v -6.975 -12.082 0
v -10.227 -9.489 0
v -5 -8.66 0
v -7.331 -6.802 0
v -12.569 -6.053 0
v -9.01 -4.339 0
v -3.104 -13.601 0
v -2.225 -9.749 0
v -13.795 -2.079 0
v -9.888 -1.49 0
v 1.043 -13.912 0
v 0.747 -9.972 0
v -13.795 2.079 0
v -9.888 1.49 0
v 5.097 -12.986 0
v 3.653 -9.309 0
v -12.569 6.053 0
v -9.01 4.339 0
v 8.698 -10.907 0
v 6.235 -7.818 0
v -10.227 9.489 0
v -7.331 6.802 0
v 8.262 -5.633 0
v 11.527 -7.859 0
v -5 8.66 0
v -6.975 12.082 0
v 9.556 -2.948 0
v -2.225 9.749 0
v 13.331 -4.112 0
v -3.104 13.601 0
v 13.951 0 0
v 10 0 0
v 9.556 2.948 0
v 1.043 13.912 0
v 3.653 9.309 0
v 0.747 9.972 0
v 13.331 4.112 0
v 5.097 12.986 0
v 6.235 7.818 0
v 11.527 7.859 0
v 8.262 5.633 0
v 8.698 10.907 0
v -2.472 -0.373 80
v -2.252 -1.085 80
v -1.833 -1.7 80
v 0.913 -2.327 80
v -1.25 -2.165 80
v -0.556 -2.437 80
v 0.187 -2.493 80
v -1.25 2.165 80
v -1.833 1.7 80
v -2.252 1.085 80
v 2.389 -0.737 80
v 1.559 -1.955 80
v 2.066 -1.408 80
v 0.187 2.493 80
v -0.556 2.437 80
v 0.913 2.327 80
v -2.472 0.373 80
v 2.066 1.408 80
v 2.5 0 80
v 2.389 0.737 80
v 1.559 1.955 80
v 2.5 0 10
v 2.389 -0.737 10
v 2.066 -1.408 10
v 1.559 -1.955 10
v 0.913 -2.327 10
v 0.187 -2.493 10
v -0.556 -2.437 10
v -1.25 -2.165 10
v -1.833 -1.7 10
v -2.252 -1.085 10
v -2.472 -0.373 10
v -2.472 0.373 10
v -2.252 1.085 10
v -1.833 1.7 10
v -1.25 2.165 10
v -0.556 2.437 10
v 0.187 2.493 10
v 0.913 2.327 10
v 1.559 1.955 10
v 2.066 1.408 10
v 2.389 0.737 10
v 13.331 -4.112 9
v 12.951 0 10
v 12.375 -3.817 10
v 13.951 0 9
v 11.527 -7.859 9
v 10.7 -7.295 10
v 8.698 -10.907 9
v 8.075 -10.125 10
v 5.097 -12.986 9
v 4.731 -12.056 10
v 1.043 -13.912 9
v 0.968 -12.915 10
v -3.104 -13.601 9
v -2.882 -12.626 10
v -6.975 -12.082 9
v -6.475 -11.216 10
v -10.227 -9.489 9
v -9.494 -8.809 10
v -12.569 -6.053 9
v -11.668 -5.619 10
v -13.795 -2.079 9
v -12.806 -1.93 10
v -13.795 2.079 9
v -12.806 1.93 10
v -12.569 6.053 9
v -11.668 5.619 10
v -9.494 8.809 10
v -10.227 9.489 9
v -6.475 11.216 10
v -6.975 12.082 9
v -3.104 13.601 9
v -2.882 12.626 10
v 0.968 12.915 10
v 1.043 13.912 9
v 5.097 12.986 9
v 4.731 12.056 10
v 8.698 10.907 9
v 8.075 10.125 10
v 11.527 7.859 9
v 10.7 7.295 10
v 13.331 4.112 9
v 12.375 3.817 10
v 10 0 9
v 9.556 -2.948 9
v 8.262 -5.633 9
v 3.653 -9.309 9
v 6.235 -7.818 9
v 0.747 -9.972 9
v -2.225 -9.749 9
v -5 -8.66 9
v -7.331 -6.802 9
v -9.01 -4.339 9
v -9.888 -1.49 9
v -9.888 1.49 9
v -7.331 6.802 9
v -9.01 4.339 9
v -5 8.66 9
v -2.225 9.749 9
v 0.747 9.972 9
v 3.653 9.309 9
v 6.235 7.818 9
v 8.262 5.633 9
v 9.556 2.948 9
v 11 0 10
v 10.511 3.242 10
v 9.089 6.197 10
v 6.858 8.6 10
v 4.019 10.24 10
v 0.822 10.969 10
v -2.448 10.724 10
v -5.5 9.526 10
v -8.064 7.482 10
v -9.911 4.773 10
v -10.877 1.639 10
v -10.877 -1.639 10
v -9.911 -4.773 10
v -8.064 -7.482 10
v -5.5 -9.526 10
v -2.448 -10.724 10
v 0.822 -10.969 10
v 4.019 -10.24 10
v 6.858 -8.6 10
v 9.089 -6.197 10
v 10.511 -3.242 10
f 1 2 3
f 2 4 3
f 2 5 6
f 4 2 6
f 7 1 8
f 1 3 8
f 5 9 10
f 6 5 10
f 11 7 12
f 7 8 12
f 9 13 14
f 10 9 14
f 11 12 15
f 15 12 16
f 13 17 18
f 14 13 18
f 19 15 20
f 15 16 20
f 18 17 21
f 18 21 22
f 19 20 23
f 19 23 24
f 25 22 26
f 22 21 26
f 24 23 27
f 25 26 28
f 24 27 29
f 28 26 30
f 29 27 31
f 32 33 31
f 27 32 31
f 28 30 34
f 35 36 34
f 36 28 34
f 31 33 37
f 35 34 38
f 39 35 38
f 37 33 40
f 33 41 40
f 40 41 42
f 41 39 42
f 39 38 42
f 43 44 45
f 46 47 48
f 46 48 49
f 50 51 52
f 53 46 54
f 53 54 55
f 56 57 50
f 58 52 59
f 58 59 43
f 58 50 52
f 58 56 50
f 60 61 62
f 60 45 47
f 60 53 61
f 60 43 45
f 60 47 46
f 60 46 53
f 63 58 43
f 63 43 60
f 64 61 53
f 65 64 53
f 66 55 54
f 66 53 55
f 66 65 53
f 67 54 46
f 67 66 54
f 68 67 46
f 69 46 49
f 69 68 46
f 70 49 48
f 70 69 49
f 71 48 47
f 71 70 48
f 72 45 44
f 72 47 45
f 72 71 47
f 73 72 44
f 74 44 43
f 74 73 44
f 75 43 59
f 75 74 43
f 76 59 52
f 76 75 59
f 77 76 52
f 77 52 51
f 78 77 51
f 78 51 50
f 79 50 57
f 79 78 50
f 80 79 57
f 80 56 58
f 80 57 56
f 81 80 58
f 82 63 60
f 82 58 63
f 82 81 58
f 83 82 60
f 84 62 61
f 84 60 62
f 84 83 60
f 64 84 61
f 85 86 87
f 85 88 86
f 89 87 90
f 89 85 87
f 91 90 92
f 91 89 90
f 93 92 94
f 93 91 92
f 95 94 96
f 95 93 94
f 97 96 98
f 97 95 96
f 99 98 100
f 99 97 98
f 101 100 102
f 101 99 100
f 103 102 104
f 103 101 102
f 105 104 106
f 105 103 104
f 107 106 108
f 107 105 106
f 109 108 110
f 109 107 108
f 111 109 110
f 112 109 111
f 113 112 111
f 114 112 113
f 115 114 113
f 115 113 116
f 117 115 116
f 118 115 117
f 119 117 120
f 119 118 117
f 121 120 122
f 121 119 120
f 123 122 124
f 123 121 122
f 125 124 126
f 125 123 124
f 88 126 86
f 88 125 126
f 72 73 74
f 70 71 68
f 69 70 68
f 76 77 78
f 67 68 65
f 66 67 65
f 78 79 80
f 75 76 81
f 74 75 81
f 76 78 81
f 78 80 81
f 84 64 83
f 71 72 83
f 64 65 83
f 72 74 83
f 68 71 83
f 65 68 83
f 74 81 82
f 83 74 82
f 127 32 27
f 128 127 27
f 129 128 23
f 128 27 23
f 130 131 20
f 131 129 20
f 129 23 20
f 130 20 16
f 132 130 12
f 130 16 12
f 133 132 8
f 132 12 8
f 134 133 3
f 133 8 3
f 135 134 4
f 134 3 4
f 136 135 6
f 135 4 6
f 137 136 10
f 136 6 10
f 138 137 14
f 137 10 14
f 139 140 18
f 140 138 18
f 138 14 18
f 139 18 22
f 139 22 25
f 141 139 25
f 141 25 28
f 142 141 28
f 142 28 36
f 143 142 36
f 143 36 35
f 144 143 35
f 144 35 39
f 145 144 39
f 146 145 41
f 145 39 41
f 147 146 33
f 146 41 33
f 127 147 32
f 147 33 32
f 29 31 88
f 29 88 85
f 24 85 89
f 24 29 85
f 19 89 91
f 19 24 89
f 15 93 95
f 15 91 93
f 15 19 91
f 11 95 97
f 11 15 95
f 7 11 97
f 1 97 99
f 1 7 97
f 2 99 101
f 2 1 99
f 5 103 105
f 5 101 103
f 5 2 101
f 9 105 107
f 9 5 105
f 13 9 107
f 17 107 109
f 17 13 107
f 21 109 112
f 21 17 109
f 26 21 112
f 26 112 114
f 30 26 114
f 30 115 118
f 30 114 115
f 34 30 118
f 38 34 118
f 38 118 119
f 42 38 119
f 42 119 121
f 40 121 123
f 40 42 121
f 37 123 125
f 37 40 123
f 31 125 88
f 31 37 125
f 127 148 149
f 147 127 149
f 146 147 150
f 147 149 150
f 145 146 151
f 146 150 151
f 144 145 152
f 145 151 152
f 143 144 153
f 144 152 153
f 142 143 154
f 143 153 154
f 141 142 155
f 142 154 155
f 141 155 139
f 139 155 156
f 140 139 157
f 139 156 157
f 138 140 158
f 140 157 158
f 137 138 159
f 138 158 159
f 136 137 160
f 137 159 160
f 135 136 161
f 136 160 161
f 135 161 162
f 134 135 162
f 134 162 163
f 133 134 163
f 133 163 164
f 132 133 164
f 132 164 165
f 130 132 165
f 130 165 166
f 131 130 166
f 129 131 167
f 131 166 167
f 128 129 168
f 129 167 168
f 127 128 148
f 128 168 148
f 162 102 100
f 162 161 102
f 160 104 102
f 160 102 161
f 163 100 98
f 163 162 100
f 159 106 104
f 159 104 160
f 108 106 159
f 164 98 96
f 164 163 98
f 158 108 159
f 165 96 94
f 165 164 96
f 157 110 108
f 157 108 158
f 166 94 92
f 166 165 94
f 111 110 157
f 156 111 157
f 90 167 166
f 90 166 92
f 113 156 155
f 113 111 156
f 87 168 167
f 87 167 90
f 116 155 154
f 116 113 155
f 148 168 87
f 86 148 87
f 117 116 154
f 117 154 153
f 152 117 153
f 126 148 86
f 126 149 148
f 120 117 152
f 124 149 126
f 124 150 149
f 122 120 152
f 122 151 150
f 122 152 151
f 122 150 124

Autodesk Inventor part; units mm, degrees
ref_plane "YZ Plane" through (0, 0, 0) normal (1, 0, 0) x (0, 1, 0)
ref_plane "XZ Plane" through (0, 0, 0) normal (0, 1, 0) x (-1, 0, 0)
ref_plane "XY Plane" through (0, 0, 0) normal (0, 0, 1) x (1, 0, 0)
sketch "スケッチ1" plane through (0, 0, 0) normal (0, 0, 1) x (1, 0, 0)
  circle A0 centre (0, 0) radius 10
  circle A1 centre (0, 0) radius 13.9508
  dimension "d0" = 20
extrude "押し出し1" add sketch "スケッチ1" along normal blind 10
chamfer "面取り1" distance 1 angle 45 1 edges at (-13.9508, 0, 10)
chamfer "面取り2" distance 1 angle 45 1 edges at (-10, 0, 10)
sketch "スケッチ2" plane through (0, 0, 10) normal (0, 0, 1) x (1, 0, 0)
  circle A0 centre (0, 0) radius 2.5
  dimension "d9" = 5
extrude "押し出し2" add sketch "スケッチ2" along normal blind 70
